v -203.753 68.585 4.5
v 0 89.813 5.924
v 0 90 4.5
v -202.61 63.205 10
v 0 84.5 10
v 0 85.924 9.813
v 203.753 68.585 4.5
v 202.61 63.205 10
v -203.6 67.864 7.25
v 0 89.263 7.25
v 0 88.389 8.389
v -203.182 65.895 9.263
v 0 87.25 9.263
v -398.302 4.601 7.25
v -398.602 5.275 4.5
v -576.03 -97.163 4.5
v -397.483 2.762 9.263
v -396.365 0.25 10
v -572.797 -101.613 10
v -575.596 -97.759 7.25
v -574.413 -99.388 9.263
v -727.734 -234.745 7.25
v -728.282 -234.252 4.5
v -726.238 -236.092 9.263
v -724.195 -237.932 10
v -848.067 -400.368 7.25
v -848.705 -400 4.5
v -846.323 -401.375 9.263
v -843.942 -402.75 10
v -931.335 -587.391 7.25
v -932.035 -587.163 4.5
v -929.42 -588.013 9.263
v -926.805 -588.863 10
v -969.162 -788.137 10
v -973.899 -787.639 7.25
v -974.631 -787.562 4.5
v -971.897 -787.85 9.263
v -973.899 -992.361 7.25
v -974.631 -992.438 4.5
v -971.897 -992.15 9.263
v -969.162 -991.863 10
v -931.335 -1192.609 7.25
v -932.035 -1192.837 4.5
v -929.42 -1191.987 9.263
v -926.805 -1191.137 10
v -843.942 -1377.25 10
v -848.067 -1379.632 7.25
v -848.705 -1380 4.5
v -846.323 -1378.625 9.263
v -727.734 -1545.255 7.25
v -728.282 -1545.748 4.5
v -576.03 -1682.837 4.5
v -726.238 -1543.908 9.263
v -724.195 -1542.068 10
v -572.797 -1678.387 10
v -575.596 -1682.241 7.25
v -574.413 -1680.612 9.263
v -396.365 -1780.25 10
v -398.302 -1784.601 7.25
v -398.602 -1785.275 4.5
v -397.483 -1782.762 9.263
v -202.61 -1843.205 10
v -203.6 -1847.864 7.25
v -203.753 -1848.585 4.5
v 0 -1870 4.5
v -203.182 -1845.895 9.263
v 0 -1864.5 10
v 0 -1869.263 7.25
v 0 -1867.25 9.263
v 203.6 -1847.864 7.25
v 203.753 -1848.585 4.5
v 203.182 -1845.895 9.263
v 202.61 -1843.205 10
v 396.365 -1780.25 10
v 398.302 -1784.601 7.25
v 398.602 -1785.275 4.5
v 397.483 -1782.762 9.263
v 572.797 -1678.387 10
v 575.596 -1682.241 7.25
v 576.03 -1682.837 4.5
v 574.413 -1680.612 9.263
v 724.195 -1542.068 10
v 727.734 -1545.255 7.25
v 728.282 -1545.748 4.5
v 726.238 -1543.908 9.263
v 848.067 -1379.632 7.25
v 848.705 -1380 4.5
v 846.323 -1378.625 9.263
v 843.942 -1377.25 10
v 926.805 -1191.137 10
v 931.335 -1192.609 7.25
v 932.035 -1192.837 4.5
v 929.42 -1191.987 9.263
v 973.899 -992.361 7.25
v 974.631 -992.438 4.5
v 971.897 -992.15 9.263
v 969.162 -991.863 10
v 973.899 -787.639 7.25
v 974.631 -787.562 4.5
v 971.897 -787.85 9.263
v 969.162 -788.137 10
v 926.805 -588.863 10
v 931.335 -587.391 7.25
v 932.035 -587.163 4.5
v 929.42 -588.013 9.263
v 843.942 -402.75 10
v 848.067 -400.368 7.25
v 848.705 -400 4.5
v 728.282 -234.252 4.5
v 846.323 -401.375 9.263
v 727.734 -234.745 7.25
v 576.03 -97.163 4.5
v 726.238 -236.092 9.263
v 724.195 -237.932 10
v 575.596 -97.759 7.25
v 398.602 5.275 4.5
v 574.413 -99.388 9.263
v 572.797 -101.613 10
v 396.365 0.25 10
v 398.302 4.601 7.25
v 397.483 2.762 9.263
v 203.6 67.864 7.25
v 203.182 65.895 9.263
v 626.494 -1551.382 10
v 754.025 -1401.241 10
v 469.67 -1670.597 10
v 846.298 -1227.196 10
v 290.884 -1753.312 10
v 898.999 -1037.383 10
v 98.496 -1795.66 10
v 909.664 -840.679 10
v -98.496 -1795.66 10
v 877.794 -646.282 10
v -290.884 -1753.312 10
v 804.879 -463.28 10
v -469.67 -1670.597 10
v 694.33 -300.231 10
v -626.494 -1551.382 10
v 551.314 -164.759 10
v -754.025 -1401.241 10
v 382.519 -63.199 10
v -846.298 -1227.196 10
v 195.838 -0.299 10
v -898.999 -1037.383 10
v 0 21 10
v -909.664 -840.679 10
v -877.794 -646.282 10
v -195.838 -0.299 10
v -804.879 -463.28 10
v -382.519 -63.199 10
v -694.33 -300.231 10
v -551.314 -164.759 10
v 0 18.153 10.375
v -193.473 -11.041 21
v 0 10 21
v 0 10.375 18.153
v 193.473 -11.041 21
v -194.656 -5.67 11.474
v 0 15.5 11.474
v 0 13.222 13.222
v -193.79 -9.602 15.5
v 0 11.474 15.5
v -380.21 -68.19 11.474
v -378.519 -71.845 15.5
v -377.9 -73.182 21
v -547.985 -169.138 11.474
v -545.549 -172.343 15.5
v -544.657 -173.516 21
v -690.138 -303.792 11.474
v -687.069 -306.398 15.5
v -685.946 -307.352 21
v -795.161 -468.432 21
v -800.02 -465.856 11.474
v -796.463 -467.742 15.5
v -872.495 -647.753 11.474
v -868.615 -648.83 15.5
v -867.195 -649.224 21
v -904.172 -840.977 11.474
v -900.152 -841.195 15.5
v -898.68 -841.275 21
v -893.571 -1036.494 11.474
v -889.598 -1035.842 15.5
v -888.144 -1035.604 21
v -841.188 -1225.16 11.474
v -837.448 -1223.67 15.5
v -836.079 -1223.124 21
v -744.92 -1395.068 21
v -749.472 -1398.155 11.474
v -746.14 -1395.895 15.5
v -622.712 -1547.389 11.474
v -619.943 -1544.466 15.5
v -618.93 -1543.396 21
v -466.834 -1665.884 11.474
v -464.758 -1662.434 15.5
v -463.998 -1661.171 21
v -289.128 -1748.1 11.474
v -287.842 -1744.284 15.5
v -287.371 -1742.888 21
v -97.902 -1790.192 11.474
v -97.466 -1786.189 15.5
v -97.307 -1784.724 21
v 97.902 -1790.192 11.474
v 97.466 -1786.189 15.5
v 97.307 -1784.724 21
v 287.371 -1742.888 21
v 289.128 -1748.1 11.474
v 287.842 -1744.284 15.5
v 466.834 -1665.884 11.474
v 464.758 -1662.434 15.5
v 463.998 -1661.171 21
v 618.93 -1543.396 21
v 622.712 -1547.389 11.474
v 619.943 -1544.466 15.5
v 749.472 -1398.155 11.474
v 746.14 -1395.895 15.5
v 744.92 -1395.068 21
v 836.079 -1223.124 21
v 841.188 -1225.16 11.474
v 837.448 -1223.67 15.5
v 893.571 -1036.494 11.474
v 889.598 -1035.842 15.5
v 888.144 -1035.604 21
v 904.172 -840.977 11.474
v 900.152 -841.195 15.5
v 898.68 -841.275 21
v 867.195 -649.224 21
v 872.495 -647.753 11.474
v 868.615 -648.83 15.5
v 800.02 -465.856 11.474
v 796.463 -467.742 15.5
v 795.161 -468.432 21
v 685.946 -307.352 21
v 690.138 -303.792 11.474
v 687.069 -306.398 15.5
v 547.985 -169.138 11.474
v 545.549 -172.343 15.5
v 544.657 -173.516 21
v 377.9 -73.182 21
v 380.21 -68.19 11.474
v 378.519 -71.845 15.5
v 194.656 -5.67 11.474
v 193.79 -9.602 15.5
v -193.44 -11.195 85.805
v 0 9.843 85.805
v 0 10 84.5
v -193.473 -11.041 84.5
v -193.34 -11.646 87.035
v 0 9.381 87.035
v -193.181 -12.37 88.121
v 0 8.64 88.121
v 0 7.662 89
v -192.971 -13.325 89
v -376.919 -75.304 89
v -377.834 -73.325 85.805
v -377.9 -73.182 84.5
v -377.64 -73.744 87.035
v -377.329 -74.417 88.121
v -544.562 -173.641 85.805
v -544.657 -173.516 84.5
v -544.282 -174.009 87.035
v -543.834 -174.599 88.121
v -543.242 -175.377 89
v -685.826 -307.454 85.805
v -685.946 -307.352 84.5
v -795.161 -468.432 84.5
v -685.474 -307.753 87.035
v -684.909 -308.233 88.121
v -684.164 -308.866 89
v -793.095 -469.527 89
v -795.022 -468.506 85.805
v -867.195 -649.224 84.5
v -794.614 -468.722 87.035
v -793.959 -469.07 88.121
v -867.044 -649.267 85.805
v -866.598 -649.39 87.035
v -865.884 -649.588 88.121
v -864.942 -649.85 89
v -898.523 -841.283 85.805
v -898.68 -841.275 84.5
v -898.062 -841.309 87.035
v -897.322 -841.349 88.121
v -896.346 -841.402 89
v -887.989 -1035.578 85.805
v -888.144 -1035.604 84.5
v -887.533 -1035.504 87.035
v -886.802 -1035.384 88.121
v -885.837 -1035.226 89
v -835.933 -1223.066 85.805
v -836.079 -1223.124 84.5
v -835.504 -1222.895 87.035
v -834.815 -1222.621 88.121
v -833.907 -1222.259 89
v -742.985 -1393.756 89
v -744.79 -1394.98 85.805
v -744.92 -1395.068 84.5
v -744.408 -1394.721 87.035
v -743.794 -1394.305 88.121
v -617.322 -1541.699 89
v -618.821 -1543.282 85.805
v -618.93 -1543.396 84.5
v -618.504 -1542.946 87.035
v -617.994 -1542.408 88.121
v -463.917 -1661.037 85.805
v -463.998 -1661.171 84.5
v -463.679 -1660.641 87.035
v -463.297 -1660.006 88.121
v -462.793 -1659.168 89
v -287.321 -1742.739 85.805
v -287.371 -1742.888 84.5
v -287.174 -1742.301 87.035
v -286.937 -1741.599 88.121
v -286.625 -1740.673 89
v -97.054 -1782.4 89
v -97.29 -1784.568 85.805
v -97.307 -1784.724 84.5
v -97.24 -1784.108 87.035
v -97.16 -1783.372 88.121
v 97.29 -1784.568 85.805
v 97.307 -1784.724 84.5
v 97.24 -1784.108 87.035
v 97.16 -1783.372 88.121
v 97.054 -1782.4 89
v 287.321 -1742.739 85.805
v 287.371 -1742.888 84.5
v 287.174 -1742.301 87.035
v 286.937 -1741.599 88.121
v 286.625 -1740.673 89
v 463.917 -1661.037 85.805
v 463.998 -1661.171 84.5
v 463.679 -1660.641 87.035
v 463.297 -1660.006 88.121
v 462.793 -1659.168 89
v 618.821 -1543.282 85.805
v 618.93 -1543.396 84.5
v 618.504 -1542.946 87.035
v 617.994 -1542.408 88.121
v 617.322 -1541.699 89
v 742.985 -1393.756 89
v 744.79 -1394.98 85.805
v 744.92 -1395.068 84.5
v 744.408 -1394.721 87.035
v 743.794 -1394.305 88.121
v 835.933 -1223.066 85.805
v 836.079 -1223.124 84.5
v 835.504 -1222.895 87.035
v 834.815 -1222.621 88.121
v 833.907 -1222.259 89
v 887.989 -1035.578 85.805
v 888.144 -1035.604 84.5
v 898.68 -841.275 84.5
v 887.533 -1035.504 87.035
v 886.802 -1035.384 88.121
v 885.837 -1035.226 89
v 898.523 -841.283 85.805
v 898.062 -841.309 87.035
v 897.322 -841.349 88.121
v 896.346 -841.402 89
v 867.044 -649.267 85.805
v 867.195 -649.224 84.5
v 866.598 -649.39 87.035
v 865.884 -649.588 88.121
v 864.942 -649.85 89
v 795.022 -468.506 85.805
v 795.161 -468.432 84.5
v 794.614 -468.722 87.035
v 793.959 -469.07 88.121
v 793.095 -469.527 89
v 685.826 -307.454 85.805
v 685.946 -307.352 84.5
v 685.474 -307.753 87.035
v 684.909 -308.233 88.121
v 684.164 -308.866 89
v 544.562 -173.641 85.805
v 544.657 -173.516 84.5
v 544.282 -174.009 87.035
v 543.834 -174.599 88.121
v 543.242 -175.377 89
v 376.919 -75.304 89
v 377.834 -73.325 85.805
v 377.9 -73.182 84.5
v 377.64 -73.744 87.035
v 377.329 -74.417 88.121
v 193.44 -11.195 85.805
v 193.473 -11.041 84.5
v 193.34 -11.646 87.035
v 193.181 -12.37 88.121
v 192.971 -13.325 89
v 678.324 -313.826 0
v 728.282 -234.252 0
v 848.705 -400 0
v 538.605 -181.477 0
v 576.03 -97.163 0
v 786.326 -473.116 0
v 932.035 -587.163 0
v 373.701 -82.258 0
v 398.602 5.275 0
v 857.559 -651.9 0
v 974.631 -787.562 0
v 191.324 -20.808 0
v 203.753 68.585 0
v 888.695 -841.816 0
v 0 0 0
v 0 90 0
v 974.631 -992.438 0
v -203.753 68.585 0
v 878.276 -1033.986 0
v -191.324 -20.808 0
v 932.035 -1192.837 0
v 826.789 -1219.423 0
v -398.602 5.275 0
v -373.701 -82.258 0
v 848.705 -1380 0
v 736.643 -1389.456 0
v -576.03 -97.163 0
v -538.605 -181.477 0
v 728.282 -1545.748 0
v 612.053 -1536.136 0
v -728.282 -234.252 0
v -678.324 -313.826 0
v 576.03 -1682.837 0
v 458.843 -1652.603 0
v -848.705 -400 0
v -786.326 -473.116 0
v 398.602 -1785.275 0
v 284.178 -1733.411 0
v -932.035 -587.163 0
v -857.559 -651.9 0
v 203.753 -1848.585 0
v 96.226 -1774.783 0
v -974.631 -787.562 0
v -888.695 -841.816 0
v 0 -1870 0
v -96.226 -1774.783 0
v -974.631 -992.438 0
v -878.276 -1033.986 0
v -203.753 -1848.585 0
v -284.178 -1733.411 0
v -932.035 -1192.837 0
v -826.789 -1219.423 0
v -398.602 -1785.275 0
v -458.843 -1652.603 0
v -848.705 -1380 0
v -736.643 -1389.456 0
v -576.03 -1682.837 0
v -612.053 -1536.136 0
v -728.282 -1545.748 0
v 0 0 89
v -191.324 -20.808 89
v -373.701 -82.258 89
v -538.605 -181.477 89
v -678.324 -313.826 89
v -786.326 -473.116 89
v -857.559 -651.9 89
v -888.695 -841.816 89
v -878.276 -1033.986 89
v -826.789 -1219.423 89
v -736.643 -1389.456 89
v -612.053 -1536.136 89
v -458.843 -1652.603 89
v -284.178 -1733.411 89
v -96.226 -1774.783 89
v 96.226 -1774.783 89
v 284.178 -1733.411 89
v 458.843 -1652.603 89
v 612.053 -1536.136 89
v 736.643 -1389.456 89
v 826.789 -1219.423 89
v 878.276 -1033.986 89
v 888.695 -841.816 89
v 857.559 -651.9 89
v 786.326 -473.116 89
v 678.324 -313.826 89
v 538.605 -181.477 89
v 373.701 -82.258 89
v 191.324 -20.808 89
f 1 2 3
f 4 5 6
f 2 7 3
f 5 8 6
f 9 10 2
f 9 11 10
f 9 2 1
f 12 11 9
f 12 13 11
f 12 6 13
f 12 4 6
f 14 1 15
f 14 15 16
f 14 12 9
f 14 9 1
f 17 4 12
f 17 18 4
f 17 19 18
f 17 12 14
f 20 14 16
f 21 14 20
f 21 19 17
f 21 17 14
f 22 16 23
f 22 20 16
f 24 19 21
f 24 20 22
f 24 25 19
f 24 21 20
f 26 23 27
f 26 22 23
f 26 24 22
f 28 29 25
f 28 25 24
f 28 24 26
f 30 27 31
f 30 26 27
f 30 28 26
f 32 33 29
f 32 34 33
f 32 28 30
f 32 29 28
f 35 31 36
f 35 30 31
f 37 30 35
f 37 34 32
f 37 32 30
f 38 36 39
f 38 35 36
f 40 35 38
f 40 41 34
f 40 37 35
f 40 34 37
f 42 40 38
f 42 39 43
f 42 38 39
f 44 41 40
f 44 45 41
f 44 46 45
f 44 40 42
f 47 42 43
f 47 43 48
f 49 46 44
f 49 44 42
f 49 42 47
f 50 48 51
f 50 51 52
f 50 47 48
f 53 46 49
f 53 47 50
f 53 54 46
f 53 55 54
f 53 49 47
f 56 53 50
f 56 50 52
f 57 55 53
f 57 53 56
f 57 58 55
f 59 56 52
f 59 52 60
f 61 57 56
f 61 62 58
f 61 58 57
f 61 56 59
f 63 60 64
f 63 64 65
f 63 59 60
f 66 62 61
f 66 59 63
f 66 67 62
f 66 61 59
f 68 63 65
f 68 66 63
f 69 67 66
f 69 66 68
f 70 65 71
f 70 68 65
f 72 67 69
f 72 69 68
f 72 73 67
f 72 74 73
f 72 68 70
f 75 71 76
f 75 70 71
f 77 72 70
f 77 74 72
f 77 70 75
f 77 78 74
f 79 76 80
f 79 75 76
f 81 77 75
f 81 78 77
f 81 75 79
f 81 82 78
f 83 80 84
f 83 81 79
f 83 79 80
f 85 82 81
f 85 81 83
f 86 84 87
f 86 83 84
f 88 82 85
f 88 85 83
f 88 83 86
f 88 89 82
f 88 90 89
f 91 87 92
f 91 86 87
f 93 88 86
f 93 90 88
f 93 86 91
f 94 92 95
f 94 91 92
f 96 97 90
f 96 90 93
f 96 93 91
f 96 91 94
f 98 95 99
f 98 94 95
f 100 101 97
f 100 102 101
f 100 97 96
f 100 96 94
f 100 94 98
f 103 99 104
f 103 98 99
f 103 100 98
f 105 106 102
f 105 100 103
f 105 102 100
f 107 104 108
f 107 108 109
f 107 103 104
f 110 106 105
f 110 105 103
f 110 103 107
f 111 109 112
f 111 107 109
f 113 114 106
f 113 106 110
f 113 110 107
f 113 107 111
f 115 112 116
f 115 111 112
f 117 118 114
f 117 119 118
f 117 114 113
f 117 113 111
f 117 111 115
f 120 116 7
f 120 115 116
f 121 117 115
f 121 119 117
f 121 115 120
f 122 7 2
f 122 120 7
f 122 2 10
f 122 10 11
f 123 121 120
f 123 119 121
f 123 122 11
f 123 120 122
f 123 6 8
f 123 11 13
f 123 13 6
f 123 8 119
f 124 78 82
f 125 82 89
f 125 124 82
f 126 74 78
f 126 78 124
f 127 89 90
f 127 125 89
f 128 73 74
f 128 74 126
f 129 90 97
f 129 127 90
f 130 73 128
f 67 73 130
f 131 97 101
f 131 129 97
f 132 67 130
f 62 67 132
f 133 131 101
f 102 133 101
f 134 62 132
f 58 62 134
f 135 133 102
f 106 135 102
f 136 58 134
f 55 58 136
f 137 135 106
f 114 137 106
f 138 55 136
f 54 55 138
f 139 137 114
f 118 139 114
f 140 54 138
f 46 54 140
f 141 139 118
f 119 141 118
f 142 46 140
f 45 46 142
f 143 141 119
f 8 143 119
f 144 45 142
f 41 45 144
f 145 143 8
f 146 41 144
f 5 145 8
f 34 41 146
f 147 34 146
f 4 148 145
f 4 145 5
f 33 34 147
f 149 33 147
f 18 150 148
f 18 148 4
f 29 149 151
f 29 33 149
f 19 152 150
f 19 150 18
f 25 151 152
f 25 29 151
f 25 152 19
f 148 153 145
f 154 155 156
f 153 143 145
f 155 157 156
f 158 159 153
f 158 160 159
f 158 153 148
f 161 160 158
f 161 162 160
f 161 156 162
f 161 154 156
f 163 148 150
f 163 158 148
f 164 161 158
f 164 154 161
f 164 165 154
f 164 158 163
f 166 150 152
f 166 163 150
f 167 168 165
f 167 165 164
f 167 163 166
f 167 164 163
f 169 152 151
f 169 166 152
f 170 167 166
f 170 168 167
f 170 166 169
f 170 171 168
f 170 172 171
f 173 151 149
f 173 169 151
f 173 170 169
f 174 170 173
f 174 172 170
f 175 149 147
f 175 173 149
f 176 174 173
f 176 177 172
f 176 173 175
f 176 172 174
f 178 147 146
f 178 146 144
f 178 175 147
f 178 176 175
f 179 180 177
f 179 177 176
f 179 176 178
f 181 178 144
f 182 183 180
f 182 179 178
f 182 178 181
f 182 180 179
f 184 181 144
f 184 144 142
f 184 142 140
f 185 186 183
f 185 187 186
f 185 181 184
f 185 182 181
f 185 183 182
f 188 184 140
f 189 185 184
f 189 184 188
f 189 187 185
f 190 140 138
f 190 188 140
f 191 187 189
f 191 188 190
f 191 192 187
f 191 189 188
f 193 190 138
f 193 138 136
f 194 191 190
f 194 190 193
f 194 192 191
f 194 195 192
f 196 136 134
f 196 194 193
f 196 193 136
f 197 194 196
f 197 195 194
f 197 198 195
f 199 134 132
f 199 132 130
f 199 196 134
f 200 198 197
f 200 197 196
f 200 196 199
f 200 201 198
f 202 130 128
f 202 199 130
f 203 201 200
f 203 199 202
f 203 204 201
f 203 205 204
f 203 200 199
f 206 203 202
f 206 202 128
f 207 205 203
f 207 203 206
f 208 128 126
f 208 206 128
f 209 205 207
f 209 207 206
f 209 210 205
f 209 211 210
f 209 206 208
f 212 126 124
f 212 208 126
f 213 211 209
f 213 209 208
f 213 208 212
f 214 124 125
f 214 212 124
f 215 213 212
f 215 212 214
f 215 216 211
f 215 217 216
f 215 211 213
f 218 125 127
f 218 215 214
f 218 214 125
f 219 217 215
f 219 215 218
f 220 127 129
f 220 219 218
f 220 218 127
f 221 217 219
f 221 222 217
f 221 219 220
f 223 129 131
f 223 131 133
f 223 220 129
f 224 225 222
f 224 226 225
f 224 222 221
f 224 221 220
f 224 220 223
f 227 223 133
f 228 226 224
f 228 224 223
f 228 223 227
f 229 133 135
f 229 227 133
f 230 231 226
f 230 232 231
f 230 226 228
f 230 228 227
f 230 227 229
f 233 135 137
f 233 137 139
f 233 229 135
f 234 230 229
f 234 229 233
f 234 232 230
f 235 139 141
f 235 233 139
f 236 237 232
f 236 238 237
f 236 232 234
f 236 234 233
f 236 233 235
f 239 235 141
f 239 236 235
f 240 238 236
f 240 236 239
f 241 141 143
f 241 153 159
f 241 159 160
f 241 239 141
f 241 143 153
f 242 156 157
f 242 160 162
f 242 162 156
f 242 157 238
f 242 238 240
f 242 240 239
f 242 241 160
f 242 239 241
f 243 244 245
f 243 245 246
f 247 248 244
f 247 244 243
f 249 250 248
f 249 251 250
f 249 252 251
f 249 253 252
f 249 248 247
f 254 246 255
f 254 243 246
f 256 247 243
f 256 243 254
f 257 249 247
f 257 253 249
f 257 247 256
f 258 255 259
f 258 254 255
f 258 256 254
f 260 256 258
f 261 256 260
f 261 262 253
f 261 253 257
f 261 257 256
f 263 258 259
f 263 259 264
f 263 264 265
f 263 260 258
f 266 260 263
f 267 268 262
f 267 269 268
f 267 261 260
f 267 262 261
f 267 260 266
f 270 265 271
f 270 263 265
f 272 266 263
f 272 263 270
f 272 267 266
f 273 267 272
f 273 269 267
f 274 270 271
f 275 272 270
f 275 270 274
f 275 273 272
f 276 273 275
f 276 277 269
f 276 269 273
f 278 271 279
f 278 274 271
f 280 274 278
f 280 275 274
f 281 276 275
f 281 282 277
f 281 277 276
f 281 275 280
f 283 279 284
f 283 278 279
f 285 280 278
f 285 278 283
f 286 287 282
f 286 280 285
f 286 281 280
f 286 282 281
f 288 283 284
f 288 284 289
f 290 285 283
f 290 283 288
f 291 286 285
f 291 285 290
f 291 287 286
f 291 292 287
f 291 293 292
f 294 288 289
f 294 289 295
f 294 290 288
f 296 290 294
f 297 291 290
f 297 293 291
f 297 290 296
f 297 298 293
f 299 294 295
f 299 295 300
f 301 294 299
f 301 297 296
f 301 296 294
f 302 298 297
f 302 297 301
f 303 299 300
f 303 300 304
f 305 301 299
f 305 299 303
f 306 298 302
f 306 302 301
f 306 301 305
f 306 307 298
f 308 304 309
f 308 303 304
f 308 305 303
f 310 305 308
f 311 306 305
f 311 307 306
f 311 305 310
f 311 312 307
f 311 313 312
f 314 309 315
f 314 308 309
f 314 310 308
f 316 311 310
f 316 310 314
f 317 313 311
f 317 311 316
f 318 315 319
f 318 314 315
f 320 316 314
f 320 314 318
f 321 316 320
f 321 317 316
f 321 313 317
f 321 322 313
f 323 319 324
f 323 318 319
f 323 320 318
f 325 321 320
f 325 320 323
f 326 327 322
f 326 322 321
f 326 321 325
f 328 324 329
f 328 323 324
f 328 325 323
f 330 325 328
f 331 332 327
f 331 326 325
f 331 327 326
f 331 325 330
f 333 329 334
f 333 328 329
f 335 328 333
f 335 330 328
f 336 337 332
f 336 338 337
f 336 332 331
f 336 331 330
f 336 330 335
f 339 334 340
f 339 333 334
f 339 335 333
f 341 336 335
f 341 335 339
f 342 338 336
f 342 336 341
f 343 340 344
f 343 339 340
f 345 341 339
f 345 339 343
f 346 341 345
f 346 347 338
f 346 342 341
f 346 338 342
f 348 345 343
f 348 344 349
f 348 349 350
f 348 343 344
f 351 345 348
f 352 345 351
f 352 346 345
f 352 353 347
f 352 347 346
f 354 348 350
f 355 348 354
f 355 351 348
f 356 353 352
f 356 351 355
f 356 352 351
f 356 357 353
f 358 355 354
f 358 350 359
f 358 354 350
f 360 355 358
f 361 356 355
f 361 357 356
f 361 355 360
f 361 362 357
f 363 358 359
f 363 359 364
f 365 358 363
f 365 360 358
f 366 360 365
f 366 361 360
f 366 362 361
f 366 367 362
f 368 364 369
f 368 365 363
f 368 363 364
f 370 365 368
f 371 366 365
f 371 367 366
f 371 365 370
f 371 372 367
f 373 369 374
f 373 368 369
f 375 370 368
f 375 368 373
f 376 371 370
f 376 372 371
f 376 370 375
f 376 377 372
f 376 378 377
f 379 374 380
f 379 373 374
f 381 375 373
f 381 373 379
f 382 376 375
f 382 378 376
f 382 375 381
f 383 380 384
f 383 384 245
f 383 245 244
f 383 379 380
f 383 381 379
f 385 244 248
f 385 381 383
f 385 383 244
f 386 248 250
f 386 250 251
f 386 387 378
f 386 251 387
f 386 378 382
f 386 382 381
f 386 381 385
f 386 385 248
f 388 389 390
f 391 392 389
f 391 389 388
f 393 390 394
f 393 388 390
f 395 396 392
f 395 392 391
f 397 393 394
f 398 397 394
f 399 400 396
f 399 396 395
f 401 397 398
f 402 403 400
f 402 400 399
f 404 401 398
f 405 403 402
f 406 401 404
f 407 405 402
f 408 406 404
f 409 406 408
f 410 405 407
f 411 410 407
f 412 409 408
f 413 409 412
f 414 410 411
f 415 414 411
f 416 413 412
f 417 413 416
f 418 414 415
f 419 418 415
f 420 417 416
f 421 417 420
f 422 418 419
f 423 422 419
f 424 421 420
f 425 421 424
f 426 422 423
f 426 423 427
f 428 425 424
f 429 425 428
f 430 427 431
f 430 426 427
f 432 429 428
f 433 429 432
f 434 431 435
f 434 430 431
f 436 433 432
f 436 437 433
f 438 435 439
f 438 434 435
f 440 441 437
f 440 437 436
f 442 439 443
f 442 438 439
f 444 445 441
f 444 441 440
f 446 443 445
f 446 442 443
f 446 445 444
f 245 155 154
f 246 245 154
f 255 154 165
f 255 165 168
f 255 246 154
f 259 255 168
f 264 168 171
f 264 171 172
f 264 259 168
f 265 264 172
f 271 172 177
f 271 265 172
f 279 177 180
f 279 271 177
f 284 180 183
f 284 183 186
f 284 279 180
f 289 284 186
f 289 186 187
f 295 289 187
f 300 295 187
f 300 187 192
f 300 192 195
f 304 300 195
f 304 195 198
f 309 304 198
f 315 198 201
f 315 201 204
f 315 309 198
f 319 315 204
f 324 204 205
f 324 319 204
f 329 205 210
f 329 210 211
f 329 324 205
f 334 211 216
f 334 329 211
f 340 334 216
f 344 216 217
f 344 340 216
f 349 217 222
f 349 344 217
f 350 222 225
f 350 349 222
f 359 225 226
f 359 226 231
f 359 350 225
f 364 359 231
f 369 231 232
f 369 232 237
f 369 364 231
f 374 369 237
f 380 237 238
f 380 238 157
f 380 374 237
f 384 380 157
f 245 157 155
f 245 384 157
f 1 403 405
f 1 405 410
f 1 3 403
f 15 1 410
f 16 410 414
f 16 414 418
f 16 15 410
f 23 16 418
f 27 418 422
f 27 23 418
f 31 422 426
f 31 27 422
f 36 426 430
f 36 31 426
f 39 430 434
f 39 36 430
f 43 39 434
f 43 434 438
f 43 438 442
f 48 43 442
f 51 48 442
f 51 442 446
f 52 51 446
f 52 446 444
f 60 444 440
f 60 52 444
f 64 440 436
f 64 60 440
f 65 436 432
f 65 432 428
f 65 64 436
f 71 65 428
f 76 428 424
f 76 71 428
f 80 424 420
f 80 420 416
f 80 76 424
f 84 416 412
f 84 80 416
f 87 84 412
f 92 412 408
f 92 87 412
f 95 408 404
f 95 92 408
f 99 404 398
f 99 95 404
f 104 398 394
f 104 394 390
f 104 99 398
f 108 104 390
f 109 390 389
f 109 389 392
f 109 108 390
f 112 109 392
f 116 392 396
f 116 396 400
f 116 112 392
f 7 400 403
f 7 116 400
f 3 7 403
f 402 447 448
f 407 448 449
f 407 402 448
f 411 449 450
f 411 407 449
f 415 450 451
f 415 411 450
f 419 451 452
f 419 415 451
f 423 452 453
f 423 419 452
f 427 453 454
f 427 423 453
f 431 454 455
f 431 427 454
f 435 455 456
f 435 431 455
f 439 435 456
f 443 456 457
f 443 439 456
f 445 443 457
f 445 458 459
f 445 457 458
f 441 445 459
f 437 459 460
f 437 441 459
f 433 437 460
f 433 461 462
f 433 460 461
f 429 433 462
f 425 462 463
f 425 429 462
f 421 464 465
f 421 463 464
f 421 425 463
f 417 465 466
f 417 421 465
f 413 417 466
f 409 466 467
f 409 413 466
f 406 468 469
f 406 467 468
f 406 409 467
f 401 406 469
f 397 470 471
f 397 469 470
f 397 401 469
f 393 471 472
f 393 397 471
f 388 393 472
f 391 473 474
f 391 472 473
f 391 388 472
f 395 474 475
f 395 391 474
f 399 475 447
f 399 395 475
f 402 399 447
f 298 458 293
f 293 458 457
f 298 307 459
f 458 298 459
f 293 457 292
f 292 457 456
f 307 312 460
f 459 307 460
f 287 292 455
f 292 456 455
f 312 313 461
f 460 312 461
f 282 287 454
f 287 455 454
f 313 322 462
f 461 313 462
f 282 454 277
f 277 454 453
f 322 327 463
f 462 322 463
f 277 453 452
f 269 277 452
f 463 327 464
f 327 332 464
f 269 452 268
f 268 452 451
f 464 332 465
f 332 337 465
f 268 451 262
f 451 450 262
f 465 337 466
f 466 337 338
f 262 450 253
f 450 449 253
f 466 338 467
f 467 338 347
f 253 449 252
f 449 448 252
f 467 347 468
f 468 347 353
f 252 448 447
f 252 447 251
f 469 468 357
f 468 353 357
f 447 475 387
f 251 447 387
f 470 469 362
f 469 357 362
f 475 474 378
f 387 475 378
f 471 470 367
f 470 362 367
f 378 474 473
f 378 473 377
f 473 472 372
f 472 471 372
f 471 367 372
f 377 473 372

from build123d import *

# Parameters (mm, degrees)
F2_W     = 1953.7661696216
F2_H     = 27.2181874708
F3_DEPTH = 900


with BuildPart() as f1:
    # F0 (on Right) → F1 (revolve)
    with BuildSketch(Plane.YZ):
        with BuildLine():
            Line((4.5, 90), (0, 90))
            Line((0, 90), (0, 0))
            Line((0, 0), (90, 0))
            Line((90, 0), (90, 4.5))
            ThreePointArc((90, 4.5), (88.3890872965, 8.3890872965), (84.5, 10))
            Line((84.5, 10), (21, 10))
            ThreePointArc((21, 10), (13.2218254069, 13.2218254069), (10, 21))
            Line((10, 21), (10, 84.5))
            ThreePointArc((10, 84.5), (8.3890872965, 88.3890872965), (4.5, 90))
        make_face()
    revolve(axis=Axis((0, -890, 43.0200174451), (0, 0, 1)))

    # F2 (on Right) → F3 (cut, symmetric)
    with BuildSketch(Plane.YZ):
        with Locations((-897.6354291663, 102.6090937354)):
            Rectangle(F2_W, F2_H)
    extrude(amount=F3_DEPTH, both=True, mode=Mode.SUBTRACT)


solid = f1.part
